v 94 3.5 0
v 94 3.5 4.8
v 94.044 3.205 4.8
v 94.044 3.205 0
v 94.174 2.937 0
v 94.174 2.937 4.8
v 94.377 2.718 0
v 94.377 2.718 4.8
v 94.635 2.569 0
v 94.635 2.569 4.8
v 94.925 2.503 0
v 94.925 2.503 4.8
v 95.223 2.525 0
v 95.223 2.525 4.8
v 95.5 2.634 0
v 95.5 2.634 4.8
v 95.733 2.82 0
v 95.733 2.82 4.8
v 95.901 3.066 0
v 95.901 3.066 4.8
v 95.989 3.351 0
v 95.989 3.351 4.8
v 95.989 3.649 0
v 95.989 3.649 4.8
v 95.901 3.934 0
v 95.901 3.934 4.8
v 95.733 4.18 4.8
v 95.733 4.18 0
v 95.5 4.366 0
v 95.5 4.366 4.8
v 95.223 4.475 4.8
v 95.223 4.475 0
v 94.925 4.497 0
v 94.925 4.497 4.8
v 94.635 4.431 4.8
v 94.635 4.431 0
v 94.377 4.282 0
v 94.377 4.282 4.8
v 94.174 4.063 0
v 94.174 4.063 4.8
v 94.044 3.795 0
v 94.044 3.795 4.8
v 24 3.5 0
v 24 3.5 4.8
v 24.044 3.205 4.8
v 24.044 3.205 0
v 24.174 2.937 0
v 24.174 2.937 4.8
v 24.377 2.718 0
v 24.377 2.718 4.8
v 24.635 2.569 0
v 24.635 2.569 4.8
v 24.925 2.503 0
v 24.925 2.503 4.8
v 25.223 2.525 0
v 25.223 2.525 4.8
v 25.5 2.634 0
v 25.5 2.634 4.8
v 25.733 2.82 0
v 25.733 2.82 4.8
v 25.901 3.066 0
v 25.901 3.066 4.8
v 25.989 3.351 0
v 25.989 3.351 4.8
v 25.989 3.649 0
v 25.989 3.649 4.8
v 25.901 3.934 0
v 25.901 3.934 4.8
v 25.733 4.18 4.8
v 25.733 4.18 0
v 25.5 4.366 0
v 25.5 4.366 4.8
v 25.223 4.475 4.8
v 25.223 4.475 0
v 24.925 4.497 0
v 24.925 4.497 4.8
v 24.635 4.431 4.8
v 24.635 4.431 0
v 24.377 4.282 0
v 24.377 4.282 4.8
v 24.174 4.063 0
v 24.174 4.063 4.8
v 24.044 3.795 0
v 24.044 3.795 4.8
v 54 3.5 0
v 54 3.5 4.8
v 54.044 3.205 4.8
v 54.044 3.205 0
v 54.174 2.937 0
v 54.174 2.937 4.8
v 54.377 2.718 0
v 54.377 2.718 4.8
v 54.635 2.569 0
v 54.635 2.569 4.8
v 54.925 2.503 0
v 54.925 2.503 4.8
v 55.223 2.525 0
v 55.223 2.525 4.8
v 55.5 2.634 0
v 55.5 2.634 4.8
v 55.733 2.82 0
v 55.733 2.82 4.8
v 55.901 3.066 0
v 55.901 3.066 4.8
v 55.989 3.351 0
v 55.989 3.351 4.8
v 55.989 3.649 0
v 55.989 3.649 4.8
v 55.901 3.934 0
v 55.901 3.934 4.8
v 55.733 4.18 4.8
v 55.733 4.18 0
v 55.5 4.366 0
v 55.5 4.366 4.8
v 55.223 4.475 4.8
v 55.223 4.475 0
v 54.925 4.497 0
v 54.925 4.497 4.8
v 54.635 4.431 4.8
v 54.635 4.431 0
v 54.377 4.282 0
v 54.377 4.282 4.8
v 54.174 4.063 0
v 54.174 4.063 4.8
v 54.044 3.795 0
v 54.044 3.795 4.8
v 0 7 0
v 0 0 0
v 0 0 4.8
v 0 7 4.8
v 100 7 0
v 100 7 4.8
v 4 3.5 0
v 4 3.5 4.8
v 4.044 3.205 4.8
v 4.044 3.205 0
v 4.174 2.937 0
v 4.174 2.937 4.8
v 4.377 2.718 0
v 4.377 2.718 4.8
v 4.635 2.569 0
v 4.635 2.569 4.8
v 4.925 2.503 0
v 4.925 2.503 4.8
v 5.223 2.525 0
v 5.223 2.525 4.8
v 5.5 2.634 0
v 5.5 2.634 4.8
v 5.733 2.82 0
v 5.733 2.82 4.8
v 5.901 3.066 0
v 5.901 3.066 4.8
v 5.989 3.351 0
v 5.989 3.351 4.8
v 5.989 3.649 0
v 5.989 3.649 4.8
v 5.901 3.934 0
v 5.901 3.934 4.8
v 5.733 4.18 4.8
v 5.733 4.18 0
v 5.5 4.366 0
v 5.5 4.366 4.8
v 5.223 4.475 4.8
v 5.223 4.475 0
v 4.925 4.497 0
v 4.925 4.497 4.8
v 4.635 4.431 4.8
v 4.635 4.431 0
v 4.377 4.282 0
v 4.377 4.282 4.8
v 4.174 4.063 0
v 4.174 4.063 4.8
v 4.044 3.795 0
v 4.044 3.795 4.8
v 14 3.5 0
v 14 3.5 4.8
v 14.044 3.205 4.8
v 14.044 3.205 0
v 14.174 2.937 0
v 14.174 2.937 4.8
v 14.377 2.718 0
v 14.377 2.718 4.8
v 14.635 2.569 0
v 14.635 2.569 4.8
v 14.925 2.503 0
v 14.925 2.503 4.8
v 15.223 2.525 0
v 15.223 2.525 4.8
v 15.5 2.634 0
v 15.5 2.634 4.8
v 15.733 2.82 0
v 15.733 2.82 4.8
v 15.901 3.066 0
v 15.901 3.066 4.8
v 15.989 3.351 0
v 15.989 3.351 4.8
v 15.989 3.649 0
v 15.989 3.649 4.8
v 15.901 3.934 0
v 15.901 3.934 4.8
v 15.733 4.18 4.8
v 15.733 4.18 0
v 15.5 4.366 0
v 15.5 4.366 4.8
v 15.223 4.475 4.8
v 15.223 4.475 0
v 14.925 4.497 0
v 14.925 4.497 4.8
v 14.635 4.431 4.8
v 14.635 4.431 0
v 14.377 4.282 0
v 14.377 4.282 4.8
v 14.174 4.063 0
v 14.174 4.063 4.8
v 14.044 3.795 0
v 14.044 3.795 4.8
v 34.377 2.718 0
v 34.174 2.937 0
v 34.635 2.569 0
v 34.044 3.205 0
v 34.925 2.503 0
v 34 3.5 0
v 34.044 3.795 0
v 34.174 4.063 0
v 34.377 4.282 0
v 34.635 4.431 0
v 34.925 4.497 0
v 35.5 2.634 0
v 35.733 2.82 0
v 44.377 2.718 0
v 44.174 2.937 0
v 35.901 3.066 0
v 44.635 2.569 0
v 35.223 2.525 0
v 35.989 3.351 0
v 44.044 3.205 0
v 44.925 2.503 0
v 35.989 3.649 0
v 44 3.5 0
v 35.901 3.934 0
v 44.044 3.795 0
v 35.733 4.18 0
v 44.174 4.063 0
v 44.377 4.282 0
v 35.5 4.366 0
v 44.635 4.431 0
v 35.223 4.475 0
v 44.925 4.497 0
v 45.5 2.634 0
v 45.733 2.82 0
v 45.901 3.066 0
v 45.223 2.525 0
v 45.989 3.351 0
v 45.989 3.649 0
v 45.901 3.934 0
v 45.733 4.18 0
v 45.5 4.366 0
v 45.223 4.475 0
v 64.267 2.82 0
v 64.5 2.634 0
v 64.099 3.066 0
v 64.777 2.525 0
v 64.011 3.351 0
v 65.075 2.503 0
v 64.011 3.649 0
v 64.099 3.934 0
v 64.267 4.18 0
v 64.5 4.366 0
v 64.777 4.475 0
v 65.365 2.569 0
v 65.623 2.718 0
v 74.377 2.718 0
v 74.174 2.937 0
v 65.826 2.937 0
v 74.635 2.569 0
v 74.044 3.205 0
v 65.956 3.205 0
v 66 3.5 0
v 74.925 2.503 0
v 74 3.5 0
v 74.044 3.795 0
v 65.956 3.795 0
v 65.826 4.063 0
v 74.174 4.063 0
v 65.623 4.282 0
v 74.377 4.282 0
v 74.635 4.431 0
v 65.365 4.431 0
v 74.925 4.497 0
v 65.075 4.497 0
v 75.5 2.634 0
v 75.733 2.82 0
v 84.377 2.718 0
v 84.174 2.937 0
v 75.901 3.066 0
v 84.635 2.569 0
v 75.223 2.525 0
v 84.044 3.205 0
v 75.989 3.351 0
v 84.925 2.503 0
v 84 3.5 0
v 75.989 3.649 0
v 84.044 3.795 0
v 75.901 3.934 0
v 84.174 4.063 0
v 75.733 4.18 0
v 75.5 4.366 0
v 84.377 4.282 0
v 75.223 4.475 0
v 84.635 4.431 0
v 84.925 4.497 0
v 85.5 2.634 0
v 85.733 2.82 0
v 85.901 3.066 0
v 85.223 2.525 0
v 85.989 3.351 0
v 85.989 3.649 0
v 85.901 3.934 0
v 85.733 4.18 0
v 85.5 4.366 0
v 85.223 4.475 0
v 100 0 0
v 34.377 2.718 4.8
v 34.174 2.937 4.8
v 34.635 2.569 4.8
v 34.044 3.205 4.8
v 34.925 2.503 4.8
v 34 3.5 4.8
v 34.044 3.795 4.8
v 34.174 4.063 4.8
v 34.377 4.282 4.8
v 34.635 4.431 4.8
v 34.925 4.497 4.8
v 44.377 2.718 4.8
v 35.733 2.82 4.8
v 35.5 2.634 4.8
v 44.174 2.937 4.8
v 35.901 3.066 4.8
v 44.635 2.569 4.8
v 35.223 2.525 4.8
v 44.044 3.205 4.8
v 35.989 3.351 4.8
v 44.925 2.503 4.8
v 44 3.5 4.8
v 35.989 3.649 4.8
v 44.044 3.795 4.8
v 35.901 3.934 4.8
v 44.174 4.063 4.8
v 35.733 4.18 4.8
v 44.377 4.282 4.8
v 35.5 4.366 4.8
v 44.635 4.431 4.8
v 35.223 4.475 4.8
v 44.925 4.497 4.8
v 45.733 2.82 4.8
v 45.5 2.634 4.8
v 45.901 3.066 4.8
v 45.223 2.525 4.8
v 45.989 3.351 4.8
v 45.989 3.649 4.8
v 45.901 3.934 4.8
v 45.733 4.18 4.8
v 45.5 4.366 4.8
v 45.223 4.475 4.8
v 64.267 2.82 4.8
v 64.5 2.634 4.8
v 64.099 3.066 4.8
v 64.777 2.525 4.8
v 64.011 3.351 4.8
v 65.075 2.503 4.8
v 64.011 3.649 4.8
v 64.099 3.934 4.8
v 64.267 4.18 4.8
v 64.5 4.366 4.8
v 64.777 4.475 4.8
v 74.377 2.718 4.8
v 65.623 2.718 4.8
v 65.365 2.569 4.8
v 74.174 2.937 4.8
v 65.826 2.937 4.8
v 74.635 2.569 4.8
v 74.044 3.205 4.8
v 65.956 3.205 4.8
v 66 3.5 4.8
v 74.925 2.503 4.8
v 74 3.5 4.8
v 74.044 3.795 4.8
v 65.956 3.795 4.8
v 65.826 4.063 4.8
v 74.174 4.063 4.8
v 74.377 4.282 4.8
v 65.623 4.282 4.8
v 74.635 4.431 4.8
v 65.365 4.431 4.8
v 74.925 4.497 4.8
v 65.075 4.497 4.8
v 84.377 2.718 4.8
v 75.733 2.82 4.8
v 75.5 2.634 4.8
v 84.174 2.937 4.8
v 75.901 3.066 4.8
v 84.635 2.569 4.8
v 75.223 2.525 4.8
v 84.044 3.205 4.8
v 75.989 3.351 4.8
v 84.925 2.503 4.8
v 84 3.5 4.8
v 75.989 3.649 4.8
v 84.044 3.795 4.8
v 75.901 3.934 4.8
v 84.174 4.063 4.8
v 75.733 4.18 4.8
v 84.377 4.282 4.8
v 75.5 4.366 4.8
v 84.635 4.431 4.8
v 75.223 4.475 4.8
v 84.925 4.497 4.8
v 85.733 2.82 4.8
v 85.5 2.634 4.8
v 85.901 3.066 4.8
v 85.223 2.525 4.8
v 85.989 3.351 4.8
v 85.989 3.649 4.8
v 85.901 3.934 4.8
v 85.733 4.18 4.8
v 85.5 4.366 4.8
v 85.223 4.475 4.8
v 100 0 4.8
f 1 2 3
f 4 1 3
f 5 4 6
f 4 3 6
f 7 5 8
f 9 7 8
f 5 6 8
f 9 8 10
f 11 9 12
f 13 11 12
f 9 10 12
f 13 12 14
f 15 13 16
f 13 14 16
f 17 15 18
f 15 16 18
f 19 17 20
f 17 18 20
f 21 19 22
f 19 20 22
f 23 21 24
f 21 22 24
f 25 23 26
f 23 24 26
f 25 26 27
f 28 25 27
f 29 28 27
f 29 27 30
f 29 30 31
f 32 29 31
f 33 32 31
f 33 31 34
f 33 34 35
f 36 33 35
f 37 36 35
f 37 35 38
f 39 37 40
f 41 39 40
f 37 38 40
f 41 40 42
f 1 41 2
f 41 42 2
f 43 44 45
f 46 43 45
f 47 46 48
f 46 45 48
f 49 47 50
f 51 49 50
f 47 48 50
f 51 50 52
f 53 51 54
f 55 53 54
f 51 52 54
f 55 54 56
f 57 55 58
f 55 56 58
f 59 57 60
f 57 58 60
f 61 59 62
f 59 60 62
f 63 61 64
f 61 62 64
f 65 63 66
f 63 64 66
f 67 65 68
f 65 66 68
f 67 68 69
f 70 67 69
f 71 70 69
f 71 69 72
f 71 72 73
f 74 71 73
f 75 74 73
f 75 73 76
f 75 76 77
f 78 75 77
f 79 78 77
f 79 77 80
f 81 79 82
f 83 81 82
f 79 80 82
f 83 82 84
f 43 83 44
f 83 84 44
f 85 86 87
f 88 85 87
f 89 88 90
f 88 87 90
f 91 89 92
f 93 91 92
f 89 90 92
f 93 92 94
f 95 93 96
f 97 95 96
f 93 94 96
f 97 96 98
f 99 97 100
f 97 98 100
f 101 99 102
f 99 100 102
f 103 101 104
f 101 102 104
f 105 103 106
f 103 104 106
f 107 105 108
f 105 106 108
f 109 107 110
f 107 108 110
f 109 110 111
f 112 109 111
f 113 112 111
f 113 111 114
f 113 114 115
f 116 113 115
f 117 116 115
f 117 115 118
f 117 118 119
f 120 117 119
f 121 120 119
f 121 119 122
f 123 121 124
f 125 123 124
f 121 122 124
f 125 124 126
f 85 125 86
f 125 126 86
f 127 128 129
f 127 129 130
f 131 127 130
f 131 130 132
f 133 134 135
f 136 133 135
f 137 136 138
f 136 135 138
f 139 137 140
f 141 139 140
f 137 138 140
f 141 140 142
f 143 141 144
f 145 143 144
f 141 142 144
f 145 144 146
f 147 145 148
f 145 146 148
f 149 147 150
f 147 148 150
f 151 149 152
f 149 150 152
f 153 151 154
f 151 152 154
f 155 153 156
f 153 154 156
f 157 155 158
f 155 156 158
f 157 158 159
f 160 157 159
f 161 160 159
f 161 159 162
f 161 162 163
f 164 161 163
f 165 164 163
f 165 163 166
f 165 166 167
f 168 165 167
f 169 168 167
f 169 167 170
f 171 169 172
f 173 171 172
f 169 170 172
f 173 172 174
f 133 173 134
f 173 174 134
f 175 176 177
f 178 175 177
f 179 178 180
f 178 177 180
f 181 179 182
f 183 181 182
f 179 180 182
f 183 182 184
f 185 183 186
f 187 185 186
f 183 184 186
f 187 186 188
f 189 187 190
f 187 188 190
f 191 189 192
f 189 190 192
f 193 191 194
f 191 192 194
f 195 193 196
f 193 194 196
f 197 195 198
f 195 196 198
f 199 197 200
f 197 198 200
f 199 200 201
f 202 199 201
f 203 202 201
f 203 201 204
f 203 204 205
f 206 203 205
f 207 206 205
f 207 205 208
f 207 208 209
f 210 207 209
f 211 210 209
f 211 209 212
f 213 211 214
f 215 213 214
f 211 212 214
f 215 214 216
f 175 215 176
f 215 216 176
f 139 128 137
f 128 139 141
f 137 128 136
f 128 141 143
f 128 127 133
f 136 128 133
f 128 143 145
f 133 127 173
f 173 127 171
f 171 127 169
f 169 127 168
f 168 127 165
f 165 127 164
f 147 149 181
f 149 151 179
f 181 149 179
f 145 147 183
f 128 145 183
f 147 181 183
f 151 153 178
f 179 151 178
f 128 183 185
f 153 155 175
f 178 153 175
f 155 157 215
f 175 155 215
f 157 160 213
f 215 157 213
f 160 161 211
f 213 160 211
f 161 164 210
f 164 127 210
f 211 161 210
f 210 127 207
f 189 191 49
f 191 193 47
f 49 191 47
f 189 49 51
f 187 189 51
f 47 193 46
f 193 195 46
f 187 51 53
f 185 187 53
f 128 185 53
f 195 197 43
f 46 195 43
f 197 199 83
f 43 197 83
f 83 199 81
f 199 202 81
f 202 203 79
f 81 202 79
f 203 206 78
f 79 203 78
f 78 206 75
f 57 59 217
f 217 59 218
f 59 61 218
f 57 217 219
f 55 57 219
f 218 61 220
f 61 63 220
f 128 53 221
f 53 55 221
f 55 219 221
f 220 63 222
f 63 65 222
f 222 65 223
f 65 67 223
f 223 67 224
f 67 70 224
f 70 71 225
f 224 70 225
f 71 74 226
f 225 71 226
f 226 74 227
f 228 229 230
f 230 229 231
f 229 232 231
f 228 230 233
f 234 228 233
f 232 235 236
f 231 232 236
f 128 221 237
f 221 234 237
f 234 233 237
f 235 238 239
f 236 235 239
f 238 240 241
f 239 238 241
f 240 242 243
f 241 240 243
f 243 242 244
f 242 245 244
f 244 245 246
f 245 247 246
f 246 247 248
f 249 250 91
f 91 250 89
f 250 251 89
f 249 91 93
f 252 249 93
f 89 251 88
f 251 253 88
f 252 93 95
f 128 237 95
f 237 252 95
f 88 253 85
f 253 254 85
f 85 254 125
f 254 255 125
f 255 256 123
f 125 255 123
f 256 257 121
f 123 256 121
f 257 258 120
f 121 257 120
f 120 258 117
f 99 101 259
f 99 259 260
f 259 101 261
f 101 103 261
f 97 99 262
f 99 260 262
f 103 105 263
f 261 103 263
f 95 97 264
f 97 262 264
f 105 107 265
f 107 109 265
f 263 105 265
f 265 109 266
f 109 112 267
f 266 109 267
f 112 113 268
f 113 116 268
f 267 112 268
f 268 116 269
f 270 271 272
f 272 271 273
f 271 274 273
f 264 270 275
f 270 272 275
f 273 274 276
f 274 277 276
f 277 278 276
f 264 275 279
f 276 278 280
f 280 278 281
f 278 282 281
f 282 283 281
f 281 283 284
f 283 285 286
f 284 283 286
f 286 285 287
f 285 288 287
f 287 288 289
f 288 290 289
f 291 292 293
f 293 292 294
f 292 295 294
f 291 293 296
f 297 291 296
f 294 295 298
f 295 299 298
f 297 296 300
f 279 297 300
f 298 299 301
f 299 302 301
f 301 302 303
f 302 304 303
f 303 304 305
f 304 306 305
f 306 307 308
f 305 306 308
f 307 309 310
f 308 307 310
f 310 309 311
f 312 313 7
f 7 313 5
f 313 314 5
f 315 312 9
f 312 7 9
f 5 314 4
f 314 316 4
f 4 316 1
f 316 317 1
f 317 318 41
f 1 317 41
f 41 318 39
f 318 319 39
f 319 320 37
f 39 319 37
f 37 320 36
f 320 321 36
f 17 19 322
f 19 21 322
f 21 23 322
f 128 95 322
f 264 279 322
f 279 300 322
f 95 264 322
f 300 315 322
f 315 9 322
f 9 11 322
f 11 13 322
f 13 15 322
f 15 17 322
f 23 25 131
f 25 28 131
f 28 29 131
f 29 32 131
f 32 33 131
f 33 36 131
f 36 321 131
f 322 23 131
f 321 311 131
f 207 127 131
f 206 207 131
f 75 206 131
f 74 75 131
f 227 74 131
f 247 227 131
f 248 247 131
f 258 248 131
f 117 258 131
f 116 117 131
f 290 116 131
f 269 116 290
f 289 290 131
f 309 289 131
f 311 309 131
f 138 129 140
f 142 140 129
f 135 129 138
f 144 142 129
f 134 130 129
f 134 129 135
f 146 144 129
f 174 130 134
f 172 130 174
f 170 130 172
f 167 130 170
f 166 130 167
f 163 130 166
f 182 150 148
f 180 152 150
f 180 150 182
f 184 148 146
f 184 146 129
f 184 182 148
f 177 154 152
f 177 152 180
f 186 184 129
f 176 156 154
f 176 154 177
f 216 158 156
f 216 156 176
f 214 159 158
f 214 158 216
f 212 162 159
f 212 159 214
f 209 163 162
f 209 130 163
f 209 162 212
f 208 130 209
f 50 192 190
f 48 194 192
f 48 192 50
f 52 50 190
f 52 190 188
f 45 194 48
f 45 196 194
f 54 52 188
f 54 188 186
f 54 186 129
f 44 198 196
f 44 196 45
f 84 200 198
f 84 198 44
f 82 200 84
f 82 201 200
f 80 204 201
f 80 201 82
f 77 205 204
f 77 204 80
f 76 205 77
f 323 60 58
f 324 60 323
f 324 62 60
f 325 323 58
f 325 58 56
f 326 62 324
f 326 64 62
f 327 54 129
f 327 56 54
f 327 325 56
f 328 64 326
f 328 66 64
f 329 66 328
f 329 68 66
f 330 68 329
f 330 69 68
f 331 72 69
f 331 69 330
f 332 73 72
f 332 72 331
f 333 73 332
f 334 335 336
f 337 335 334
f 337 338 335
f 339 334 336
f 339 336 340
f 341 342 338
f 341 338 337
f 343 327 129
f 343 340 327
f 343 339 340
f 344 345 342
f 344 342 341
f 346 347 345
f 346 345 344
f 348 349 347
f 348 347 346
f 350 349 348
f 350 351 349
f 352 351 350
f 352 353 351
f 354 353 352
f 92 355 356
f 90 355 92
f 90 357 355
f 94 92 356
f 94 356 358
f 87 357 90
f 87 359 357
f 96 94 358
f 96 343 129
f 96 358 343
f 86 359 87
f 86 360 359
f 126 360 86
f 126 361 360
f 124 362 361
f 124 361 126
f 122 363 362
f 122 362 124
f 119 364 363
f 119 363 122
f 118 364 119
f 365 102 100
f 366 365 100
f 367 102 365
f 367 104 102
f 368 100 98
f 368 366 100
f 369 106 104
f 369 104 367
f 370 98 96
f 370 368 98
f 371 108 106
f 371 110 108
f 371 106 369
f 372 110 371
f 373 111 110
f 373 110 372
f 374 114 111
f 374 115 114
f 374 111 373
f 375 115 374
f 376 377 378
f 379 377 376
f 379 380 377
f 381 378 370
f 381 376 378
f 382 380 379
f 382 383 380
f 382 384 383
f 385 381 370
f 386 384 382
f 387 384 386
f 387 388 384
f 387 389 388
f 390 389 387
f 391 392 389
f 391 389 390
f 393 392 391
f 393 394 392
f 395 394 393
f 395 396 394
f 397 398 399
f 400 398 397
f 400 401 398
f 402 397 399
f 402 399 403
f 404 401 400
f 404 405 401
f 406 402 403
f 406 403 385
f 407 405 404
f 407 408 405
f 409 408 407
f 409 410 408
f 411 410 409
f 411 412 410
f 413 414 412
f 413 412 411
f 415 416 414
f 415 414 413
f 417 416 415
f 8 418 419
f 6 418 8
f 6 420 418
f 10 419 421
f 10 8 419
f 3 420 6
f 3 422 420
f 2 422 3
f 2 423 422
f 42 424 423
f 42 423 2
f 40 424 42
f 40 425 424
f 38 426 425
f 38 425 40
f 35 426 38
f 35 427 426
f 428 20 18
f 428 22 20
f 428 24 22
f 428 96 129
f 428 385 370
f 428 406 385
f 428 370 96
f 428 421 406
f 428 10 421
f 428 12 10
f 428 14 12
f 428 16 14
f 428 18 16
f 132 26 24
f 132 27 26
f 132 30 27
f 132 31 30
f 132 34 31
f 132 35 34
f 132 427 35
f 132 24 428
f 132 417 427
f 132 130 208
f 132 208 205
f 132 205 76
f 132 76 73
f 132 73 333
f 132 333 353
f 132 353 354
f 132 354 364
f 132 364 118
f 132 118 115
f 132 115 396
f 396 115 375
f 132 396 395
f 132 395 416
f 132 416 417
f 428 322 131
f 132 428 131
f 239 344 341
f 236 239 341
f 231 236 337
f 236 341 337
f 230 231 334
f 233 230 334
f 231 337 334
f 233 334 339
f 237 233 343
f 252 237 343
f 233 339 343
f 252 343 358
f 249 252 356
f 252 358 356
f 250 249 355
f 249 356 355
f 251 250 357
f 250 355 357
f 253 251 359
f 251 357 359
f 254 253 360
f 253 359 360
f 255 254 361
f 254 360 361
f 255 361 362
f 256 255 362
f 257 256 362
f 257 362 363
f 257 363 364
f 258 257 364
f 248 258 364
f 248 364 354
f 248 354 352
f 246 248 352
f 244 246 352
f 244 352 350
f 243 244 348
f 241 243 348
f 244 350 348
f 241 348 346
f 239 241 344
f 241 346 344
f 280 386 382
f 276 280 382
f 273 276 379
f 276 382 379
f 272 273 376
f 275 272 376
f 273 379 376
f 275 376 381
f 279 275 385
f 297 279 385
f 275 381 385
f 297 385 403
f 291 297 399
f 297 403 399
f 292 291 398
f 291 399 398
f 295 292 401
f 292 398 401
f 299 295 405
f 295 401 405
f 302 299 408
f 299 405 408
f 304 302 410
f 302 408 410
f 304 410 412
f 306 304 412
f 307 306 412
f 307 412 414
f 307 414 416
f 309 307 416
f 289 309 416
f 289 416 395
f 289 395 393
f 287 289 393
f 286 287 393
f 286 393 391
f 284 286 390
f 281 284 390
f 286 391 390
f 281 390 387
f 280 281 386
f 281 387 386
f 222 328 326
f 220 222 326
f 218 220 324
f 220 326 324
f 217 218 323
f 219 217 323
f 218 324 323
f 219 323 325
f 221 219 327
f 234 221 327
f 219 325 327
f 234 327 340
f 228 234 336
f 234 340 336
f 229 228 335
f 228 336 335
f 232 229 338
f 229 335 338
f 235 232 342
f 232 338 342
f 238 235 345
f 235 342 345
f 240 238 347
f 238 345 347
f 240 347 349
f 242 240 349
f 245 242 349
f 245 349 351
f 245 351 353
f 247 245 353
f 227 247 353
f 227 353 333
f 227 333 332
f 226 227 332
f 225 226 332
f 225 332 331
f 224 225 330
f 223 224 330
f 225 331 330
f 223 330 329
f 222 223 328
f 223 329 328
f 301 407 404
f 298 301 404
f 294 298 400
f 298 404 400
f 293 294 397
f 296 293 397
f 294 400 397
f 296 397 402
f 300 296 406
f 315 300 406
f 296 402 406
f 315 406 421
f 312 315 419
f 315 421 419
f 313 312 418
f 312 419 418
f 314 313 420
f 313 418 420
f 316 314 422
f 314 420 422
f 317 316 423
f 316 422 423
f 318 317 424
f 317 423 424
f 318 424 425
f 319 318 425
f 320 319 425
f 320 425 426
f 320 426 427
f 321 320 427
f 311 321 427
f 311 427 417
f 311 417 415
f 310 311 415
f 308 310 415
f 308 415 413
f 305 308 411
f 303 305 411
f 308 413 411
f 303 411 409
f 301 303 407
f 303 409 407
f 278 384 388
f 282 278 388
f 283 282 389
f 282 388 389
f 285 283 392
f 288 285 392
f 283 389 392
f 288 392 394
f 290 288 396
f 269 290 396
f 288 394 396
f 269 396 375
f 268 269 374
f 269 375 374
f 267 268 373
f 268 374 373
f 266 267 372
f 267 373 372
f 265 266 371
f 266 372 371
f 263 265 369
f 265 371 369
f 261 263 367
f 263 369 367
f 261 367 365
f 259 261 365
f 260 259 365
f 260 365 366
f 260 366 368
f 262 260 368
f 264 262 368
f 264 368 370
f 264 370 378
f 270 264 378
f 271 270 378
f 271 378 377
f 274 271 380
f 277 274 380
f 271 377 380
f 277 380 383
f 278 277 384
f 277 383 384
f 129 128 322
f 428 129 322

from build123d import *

# Parameters (mm, degrees)
SKETCH_1_W          = 100
SKETCH_1_H          = 7
EXTRUDE_1_DEPTH     = 4.8
SKETCH_2_R          = 1
CUT_EXTRUDE_1_DEPTH = 4.8


with BuildPart() as part:
    # 草图1 → 凸台-拉伸1 (new body)
    with BuildSketch(Plane.XY):
        with Locations((50, 3.5)):
            Rectangle(SKETCH_1_W, SKETCH_1_H)
    extrude(amount=EXTRUDE_1_DEPTH)

    # 草图2 → 切除-拉伸1 (cut)
    with BuildSketch(Plane.XY.offset(4.8)):
        with BuildLine():
            ThreePointArc((6, 3.5), (5, 4.5), (4, 3.5))
            Line((4, 3.5), (6, 3.5))
        make_face()
        with BuildLine():
            Line((6, 3.5), (4, 3.5))
            ThreePointArc((4, 3.5), (5, 2.5), (6, 3.5))
        make_face()
        with BuildLine():
            ThreePointArc((16, 3.5), (15, 4.5), (14, 3.5))
            Line((14, 3.5), (16, 3.5))
        make_face()
        with BuildLine():
            Line((16, 3.5), (14, 3.5))
            ThreePointArc((14, 3.5), (15, 2.5), (16, 3.5))
        make_face()
        with BuildLine():
            ThreePointArc((26, 3.5), (25, 4.5), (24, 3.5))
            Line((24, 3.5), (26, 3.5))
        make_face()
        with BuildLine():
            Line((26, 3.5), (24, 3.5))
            ThreePointArc((24, 3.5), (25, 2.5), (26, 3.5))
        make_face()
        with BuildLine():
            ThreePointArc((36, 3.5), (35, 4.5), (34, 3.5))
            Line((34, 3.5), (36, 3.5))
        make_face()
        with BuildLine():
            Line((36, 3.5), (34, 3.5))
            ThreePointArc((34, 3.5), (35, 2.5), (36, 3.5))
        make_face()
        with BuildLine():
            ThreePointArc((46, 3.5), (45, 4.5), (44, 3.5))
            Line((44, 3.5), (46, 3.5))
        make_face()
        with BuildLine():
            Line((46, 3.5), (44, 3.5))
            ThreePointArc((44, 3.5), (45, 2.5), (46, 3.5))
        make_face()
        with BuildLine():
            ThreePointArc((56, 3.5), (55, 4.5), (54, 3.5))
            Line((54, 3.5), (56, 3.5))
        make_face()
        with BuildLine():
            Line((56, 3.5), (54, 3.5))
            ThreePointArc((54, 3.5), (55, 2.5), (56, 3.5))
        make_face()
        with BuildLine():
            ThreePointArc((76, 3.5), (75, 4.5), (74, 3.5))
            Line((74, 3.5), (76, 3.5))
        make_face()
        with BuildLine():
            Line((76, 3.5), (74, 3.5))
            ThreePointArc((74, 3.5), (75, 2.5), (76, 3.5))
        make_face()
        with BuildLine():
            ThreePointArc((86, 3.5), (85, 4.5), (84, 3.5))
            Line((84, 3.5), (86, 3.5))
        make_face()
        with BuildLine():
            Line((86, 3.5), (84, 3.5))
            ThreePointArc((84, 3.5), (85, 2.5), (86, 3.5))
        make_face()
        with BuildLine():
            ThreePointArc((96, 3.5), (95, 4.5), (94, 3.5))
            Line((94, 3.5), (96, 3.5))
        make_face()
        with BuildLine():
            Line((96, 3.5), (94, 3.5))
            ThreePointArc((94, 3.5), (95, 2.5), (96, 3.5))
        make_face()
        with Locations((65, 3.5)):
            Circle(SKETCH_2_R)
    extrude(amount=-CUT_EXTRUDE_1_DEPTH, mode=Mode.SUBTRACT)


solid = part.part
